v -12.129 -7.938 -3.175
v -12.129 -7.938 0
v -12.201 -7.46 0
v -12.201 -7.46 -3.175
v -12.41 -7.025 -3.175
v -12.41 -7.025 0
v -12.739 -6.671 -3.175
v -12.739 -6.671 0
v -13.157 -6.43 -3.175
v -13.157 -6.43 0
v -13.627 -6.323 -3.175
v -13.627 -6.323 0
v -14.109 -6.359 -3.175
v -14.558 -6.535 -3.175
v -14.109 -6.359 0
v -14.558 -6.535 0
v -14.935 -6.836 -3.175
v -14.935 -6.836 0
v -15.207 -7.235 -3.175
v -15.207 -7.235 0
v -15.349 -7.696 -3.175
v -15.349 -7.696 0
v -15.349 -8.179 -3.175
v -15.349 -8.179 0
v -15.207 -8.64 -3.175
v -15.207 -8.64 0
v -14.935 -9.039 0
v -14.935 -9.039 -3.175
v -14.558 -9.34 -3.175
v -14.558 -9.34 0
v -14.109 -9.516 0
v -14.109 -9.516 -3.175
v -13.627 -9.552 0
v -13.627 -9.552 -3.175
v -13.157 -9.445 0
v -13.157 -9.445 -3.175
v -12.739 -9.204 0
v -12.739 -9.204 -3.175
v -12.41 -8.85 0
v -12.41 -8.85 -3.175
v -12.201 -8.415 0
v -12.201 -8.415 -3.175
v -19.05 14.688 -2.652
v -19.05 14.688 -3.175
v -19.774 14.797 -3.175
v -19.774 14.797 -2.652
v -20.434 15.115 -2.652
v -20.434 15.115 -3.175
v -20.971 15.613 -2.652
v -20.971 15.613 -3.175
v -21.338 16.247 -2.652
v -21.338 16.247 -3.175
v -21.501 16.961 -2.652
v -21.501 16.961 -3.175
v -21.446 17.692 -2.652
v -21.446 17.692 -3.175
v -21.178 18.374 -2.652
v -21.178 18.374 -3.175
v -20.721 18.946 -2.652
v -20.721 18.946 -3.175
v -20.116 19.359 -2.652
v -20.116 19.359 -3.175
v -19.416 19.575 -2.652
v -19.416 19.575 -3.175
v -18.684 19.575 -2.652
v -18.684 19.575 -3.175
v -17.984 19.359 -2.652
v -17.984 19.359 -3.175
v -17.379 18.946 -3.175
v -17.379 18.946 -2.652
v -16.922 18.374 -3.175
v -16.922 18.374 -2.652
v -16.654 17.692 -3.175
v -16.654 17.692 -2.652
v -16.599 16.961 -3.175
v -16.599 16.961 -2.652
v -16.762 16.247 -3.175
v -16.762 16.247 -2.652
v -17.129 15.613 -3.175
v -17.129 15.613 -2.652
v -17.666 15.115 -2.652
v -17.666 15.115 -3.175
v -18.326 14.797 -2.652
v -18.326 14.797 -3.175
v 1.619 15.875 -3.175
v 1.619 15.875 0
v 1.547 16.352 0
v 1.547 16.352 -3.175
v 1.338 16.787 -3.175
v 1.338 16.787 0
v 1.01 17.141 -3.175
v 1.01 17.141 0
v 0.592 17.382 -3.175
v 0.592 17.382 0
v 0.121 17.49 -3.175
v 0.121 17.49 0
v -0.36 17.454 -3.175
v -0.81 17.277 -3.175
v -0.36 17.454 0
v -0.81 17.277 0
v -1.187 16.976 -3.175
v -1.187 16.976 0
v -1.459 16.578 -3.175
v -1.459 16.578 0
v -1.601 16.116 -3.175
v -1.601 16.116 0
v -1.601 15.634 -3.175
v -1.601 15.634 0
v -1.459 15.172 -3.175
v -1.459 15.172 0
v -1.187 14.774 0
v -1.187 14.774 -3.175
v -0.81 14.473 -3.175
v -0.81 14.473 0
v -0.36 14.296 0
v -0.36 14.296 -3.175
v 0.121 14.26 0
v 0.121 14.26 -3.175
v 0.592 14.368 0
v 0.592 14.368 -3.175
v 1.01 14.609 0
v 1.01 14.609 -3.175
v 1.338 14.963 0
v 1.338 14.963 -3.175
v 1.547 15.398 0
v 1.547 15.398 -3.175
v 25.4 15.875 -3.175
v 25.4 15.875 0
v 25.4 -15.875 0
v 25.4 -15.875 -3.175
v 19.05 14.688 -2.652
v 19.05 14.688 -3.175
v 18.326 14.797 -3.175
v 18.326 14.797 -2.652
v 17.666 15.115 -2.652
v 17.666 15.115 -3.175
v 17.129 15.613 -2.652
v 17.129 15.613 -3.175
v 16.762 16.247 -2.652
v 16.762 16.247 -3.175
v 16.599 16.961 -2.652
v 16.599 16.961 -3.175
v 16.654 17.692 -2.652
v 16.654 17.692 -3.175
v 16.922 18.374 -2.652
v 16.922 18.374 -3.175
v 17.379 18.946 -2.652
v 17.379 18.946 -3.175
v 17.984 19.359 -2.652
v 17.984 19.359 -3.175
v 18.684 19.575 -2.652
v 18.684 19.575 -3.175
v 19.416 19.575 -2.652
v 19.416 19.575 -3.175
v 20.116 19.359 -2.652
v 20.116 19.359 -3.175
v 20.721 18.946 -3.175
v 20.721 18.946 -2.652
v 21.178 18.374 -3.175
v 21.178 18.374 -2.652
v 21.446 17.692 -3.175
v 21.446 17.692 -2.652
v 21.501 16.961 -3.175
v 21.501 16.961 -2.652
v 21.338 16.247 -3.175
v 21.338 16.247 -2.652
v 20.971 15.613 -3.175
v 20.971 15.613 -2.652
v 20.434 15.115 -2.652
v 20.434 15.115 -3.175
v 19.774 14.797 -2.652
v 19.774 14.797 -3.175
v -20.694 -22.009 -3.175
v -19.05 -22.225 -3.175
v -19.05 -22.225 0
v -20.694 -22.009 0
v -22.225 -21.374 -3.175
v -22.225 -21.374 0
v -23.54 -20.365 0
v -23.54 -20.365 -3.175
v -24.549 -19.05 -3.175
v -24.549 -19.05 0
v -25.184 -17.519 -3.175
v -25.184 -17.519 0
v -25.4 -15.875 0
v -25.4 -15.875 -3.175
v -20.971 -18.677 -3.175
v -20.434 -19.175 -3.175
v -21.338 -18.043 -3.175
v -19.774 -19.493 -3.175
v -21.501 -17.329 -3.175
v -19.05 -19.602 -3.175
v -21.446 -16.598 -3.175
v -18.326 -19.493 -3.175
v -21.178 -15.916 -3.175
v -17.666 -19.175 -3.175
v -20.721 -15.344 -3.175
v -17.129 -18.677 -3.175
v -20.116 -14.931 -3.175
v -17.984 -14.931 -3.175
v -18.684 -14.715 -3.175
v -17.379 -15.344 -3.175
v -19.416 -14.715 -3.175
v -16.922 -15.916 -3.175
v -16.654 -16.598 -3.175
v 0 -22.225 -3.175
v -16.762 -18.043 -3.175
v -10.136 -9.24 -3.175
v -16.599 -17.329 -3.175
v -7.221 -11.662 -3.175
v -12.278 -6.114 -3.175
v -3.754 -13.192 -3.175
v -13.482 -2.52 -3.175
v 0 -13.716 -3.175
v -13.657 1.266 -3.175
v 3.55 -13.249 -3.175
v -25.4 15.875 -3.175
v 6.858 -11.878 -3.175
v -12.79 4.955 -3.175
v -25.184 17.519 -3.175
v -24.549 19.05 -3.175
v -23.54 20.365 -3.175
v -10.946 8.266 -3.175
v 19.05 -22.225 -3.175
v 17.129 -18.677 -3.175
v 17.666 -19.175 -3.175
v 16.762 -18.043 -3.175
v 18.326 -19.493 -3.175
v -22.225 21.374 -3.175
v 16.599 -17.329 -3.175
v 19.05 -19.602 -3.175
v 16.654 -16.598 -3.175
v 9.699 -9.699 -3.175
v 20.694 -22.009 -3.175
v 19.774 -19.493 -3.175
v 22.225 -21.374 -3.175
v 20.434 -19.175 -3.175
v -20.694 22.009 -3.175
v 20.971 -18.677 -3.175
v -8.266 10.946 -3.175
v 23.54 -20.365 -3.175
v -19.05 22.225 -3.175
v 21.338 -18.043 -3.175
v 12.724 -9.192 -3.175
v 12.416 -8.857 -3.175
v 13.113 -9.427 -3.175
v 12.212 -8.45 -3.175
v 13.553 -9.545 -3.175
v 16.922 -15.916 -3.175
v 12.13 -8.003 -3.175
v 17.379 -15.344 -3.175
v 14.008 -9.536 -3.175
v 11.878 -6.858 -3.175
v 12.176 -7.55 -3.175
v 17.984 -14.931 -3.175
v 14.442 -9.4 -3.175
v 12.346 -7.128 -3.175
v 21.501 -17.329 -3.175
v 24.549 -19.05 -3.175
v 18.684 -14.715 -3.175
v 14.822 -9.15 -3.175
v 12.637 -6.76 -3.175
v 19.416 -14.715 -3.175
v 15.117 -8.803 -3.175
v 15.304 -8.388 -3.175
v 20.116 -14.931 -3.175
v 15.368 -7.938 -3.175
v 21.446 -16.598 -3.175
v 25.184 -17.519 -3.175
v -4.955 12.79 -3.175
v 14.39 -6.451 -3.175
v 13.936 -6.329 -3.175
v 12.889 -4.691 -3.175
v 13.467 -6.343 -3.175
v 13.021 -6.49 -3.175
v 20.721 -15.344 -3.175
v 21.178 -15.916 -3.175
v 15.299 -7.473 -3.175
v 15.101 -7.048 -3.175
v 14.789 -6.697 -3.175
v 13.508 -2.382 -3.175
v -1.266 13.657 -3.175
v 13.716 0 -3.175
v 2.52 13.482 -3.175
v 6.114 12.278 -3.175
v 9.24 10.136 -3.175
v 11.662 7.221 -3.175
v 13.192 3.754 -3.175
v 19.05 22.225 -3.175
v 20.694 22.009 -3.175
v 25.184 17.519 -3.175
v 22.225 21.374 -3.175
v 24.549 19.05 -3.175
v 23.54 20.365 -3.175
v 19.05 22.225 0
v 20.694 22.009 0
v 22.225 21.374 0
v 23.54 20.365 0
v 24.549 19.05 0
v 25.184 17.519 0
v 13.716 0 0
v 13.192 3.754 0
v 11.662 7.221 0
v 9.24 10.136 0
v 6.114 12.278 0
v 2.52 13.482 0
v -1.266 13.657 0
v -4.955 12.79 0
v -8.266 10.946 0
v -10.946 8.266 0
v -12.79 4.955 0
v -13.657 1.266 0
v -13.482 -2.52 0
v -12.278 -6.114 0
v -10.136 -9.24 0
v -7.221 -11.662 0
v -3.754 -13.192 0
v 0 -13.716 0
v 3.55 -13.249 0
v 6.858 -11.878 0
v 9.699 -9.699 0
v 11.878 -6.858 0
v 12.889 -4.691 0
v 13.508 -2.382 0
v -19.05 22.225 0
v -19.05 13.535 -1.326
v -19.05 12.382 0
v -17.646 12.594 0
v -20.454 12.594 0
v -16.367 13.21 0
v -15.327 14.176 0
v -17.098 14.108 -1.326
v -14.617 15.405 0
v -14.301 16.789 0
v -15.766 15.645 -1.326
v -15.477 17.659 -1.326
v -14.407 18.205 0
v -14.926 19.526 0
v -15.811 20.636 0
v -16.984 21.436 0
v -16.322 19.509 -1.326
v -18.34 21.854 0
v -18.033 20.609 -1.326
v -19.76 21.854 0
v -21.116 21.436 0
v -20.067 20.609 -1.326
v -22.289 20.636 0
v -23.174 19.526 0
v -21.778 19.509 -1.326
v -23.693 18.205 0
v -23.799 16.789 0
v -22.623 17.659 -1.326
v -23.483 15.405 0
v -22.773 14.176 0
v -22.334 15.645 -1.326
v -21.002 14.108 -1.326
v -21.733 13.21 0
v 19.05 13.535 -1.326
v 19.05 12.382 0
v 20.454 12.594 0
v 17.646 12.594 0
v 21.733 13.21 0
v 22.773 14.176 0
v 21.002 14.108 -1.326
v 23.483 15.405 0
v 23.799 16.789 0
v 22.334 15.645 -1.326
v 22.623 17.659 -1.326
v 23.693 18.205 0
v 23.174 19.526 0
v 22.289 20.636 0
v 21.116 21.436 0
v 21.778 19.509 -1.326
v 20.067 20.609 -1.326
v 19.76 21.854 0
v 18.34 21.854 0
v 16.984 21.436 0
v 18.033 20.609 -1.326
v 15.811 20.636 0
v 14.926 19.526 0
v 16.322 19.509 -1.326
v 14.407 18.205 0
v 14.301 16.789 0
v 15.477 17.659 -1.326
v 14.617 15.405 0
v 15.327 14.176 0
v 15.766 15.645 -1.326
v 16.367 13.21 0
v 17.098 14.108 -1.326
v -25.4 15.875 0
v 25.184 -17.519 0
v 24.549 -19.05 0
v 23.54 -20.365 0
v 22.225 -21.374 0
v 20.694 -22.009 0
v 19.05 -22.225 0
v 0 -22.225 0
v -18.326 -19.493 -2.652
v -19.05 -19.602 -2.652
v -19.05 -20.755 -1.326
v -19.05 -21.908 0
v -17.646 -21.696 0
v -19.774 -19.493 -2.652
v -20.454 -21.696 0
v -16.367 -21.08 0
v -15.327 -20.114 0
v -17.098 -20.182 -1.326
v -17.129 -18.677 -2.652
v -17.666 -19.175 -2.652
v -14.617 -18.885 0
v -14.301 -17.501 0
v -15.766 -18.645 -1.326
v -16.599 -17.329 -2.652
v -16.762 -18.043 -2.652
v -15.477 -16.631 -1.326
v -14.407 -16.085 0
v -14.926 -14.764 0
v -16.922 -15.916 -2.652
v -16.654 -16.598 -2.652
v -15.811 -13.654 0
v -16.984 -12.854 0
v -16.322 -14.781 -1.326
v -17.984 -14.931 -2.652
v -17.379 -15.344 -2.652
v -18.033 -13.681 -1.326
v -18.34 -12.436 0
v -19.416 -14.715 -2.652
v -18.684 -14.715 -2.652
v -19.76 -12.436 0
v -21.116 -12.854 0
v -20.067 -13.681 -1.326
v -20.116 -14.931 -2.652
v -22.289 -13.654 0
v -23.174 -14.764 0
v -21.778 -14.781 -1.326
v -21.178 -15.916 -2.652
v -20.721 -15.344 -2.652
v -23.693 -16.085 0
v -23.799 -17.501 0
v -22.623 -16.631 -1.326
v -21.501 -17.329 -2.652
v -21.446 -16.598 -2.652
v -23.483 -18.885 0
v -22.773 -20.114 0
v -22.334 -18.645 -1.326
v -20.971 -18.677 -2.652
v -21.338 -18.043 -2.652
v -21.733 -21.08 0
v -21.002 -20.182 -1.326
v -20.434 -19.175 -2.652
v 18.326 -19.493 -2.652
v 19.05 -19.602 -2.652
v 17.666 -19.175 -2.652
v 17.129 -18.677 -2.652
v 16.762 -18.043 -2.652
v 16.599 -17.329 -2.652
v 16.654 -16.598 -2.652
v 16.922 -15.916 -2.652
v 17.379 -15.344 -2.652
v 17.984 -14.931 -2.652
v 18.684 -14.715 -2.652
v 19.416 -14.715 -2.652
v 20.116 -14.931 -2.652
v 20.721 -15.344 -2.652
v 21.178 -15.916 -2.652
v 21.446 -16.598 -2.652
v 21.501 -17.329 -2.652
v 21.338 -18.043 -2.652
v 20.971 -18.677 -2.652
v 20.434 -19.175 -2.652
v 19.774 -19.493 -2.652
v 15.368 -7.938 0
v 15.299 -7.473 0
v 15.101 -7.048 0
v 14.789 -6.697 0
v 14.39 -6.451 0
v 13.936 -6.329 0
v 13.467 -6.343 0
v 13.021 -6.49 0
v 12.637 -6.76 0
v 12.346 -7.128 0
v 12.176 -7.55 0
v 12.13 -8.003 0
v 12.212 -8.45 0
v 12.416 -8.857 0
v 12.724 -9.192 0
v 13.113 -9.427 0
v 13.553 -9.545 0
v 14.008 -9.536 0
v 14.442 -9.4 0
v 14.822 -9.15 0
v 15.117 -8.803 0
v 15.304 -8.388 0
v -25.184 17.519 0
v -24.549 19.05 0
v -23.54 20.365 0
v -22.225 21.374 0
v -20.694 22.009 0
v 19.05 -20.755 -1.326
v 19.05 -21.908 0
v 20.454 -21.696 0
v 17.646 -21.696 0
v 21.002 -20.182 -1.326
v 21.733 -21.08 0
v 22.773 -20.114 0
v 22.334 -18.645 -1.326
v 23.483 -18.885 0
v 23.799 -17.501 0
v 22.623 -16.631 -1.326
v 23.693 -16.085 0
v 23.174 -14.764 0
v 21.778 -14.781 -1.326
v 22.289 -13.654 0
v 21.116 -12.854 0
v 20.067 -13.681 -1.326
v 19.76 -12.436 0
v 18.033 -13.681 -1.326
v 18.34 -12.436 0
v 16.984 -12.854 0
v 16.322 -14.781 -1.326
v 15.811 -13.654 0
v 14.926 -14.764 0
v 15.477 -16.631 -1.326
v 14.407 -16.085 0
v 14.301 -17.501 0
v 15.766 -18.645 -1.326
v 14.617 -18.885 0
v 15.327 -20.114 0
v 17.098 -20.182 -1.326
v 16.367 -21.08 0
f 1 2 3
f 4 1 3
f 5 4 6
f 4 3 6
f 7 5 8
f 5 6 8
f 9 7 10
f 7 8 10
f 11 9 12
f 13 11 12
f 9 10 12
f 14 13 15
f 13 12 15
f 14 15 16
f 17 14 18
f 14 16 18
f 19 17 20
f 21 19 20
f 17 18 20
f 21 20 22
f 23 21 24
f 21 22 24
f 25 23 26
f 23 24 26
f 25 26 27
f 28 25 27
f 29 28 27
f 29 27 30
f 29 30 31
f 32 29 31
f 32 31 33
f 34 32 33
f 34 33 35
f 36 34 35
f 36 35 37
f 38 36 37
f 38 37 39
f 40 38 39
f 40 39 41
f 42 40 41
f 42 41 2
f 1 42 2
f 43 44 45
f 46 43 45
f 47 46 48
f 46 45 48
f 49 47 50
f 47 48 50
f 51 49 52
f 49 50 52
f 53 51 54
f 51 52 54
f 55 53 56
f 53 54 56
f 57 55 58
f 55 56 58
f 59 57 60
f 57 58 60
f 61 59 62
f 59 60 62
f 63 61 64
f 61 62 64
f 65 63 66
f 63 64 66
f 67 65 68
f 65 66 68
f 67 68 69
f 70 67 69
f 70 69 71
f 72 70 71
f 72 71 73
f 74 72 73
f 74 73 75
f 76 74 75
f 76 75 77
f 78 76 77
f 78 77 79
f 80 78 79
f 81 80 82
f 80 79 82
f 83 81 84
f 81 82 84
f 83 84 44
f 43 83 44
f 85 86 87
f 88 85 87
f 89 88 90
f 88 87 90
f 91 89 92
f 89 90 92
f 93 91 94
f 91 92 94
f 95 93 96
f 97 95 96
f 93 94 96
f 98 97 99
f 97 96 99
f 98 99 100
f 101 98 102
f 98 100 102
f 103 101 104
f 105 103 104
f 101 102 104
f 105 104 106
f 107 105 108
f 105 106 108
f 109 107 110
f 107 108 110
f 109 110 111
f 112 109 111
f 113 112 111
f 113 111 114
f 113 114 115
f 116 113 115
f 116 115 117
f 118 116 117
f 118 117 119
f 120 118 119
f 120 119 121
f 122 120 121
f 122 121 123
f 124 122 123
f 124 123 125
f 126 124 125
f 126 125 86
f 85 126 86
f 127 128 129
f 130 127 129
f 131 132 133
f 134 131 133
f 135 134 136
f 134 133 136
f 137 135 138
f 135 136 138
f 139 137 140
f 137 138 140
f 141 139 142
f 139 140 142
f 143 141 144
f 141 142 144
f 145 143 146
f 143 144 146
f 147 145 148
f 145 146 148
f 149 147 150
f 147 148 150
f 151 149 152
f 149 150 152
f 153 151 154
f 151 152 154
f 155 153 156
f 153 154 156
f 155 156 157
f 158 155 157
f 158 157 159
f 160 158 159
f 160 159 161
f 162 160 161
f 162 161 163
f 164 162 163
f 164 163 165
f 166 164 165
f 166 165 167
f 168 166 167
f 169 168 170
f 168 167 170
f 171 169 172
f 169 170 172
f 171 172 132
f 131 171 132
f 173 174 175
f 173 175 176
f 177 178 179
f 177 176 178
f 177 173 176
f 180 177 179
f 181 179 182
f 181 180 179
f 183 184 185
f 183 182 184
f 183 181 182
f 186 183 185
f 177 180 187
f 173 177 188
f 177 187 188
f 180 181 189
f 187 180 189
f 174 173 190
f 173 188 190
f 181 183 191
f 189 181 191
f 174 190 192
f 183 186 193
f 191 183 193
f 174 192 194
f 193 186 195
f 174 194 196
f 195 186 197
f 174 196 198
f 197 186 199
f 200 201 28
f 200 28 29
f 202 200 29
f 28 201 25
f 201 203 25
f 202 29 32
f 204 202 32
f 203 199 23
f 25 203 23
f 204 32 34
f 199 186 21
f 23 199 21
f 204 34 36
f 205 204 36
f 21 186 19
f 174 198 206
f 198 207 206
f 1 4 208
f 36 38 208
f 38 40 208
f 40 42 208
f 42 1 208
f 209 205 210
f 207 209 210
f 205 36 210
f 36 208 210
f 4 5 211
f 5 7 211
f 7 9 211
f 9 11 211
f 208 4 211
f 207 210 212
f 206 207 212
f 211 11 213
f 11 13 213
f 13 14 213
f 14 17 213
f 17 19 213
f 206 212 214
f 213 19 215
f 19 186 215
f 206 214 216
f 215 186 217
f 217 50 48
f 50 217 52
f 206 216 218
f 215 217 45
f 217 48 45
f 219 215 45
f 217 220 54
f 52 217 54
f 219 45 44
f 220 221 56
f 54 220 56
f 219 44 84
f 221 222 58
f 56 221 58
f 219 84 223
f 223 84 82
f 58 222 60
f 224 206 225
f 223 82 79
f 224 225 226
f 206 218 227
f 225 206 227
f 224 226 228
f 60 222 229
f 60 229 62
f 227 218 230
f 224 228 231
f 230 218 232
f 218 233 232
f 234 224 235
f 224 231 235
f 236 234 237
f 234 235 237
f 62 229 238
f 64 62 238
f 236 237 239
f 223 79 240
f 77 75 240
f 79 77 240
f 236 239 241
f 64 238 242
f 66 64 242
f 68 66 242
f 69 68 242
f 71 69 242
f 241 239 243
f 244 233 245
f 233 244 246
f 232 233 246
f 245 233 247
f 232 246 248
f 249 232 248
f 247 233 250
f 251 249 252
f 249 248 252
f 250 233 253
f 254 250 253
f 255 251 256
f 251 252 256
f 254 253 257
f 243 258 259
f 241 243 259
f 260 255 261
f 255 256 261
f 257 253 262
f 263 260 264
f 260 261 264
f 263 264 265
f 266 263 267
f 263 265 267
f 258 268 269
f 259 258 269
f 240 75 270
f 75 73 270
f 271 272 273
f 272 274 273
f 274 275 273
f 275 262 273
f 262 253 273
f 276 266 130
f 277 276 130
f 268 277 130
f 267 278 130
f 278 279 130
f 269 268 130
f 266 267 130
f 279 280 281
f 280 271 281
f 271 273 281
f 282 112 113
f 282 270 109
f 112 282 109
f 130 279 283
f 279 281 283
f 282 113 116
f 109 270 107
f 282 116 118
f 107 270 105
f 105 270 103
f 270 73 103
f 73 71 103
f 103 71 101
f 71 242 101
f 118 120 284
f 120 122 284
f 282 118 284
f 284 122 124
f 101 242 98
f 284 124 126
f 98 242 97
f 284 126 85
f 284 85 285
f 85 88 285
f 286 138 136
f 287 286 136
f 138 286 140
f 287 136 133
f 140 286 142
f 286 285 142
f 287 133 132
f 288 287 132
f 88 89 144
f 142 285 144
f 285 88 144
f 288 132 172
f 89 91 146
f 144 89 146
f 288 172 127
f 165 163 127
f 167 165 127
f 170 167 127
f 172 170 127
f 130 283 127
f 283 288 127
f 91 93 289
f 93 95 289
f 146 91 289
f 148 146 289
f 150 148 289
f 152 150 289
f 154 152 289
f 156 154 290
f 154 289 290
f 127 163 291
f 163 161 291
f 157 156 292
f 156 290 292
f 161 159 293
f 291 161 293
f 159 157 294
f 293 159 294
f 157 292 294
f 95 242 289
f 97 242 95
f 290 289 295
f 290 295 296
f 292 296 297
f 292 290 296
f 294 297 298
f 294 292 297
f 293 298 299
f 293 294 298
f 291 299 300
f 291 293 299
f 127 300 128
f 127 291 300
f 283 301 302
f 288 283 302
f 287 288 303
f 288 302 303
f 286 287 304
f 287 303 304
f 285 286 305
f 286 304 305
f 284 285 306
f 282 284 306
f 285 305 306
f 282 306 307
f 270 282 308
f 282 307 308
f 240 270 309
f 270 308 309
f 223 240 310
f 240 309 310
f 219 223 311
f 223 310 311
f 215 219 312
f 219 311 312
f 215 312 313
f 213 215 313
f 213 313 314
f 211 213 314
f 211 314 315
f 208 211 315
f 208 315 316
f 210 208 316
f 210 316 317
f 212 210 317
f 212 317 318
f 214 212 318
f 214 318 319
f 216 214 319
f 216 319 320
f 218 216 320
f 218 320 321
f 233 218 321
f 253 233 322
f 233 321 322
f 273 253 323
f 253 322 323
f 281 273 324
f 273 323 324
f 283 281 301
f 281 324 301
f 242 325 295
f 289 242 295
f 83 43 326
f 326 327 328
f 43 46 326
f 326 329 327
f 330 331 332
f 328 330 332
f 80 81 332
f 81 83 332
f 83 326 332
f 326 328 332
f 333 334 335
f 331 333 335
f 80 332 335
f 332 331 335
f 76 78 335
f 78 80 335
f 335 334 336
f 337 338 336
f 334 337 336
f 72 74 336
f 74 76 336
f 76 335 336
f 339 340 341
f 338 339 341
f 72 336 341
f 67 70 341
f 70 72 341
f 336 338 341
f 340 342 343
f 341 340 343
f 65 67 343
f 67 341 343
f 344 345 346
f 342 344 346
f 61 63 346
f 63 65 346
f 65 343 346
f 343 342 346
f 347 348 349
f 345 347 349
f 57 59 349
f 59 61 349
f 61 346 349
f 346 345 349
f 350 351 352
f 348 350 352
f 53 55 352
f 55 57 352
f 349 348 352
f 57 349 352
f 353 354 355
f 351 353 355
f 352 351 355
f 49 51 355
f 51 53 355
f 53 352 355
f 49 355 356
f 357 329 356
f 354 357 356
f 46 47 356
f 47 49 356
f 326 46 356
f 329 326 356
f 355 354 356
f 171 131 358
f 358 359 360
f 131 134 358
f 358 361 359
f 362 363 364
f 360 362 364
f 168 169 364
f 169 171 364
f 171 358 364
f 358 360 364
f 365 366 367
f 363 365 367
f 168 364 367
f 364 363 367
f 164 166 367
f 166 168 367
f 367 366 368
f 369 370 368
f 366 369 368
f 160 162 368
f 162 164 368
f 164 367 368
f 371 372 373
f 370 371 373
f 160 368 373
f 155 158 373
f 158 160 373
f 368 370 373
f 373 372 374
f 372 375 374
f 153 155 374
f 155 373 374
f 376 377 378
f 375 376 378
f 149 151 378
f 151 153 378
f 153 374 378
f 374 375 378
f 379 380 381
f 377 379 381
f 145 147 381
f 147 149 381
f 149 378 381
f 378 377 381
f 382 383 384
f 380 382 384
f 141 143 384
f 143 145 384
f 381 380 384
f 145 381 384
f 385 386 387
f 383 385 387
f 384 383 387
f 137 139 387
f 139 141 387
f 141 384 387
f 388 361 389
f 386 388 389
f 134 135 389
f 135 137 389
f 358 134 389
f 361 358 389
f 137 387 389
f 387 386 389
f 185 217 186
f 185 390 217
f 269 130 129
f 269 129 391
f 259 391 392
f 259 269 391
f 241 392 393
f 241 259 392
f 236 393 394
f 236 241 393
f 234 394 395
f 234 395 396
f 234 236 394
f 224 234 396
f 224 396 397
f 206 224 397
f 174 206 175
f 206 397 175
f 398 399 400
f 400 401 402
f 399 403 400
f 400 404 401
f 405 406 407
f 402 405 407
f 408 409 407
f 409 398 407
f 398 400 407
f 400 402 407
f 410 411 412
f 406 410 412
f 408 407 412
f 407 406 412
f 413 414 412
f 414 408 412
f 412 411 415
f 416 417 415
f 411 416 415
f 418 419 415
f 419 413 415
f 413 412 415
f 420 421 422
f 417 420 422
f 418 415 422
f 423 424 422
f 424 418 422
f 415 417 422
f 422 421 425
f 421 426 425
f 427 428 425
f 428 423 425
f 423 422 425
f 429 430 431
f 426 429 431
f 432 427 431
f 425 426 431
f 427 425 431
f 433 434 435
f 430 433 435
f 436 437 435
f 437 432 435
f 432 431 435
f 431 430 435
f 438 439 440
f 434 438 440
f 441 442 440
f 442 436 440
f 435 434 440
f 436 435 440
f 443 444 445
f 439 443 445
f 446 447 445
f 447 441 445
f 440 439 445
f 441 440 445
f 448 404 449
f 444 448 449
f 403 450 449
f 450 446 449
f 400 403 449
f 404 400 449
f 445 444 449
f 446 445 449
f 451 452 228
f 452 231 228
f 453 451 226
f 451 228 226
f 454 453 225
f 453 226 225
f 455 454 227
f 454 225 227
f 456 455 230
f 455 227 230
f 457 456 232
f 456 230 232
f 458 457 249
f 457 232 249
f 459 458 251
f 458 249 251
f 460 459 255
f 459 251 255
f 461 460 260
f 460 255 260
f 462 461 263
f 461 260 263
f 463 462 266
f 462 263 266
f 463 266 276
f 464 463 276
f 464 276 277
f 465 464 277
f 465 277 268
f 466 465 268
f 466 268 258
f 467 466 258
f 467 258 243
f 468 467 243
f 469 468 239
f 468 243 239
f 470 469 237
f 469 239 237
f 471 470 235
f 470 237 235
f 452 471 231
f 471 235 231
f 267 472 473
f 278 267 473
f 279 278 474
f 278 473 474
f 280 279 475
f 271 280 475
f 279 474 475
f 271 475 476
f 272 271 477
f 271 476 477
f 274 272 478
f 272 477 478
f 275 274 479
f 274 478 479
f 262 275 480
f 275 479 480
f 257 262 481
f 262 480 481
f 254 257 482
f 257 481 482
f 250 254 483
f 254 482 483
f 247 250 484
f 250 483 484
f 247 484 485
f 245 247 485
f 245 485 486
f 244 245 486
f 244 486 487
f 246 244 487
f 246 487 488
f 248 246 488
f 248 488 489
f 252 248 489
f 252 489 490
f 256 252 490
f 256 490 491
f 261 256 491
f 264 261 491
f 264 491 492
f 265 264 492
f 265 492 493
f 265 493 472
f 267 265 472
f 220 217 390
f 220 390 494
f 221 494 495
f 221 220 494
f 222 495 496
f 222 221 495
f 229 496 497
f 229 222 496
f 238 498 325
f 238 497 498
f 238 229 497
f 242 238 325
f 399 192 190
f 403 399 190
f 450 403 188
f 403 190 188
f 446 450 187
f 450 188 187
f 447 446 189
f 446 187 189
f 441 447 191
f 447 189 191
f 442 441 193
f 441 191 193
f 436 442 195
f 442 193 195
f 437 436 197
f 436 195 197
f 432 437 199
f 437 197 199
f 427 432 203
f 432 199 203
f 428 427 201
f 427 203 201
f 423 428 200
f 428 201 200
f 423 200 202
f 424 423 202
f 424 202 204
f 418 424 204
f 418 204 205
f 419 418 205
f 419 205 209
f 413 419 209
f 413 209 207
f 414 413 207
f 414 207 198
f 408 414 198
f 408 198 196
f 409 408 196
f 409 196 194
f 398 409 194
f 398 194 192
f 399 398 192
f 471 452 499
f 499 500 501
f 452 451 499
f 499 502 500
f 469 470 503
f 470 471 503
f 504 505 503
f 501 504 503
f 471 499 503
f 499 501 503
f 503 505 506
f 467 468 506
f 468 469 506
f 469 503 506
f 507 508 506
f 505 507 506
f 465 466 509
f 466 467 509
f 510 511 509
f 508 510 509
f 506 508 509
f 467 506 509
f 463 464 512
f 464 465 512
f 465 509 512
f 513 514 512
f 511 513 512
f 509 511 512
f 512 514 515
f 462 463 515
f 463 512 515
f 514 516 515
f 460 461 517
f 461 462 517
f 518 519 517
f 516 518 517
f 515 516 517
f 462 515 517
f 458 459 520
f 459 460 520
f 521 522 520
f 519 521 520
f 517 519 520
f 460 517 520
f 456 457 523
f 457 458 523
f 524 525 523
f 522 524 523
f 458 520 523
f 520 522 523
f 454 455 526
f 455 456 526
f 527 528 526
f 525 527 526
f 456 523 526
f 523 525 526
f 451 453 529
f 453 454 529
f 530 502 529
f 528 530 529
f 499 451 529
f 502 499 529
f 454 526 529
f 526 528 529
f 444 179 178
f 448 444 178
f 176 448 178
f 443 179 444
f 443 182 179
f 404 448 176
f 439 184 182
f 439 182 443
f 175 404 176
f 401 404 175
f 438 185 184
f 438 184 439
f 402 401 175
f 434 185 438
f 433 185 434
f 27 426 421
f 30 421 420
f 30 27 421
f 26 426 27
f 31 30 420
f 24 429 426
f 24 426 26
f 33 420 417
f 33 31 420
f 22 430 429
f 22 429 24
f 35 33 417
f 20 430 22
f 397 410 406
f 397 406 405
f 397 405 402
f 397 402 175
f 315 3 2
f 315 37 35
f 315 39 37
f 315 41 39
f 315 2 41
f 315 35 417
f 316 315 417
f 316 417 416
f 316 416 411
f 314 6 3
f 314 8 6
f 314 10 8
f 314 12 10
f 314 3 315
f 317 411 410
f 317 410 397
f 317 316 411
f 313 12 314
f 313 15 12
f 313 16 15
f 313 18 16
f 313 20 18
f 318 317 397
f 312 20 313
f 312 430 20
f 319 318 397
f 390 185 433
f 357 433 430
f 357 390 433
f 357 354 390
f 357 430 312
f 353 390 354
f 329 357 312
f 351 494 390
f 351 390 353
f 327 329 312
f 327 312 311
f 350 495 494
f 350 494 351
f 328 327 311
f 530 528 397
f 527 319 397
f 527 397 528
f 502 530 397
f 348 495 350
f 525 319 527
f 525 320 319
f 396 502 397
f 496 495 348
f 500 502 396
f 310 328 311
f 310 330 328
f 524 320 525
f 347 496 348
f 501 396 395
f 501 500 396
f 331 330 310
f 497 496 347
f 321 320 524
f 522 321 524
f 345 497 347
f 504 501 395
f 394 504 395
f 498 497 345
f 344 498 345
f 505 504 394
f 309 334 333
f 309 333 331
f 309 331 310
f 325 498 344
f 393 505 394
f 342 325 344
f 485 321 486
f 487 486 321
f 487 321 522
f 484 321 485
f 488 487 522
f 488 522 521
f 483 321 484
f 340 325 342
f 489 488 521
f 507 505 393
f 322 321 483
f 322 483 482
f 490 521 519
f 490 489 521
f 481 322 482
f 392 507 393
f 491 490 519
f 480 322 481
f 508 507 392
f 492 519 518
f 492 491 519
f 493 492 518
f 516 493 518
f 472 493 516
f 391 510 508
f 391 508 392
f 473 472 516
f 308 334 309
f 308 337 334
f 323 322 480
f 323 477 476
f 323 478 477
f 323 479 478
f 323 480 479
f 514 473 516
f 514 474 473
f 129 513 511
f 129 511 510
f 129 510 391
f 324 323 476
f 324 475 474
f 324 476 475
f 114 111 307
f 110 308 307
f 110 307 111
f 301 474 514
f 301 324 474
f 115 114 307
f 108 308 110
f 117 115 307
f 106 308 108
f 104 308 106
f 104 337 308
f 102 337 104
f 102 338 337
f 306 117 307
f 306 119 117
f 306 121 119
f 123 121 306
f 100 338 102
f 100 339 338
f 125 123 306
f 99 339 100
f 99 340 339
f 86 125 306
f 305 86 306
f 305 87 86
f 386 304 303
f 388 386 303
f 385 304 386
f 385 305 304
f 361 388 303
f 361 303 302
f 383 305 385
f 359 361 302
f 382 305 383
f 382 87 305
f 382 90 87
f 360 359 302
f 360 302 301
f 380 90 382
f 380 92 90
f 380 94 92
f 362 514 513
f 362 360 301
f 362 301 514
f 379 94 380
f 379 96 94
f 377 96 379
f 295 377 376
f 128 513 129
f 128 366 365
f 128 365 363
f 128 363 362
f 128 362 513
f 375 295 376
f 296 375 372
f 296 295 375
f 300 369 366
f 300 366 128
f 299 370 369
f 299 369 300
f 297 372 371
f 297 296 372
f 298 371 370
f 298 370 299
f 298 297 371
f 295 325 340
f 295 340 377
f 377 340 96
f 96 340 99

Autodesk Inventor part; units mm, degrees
ref_plane "YZ Plane" through (0, 0, 0) normal (1, 0, 0) x (0, 1, 0)
ref_plane "XZ Plane" through (0, 0, 0) normal (0, 1, 0) x (-1, 0, 0)
ref_plane "XY Plane" through (0, 0, 0) normal (0, 0, 1) x (1, 0, 0)
sketch "Sketch1" plane through (0, 0, 0) normal (0, 0, 1) x (1, 0, 0)
  line L0 (-31.75, 22.225) -> (31.75, 22.225)
  line L1 (31.75, 22.225) -> (31.75, -22.225)
  line L2 (31.75, -22.225) -> (-31.75, -22.225)
  line L3 (-31.75, -22.225) -> (-31.75, 22.225)
  circle A0 centre (0, 0) radius 13.716
  circle A1 centre (0, 0) radius 13.6017
  circle A2 centre (13.7482, -7.9375) radius 1.6193
  circle A3 centre (0, 0) radius 15.875 construction
  circle A4 centre (0, 15.875) radius 1.6193
  circle A5 centre (-13.7482, -7.9375) radius 1.6193
  circle A6 centre (0, 0) radius 21.59 construction
  line L4 (0, 0) -> (13.7482, -7.9375)
  line L5 (0, 0) -> (0, -22.225)
  line L6 (0, 0) -> (0, -22.225)
  line L7 (-31.75, 22.225) -> (-25.4, 22.225)
  line L8 (-25.4, 22.225) -> (-25.4, -22.225)
  line L9 (-25.4, -22.225) -> (-31.75, -22.225)
  line L10 (-31.75, -22.225) -> (-31.75, 22.225)
  line L11 (31.75, 22.225) -> (25.4, 22.225)
  line L12 (25.4, 22.225) -> (25.4, -22.225)
  line L13 (25.4, -22.225) -> (31.75, -22.225)
  line L14 (31.75, -22.225) -> (31.75, 22.225)
  point P0 (-19.05, 17.145)
  point P1 (-19.05, -17.145)
  point P2 (19.05, -17.145)
  point P3 (19.05, 17.145)
  dimension "d0" = 44.45
  dimension "d1" = 63.5
  dimension "d2" = 31.75
  dimension "d3" = 22.225
  dimension "d4" = 27.432
  dimension "d7" = 3.2385
  dimension "d9" = 15.875
  dimension "d15" = 360
  dimension "d17" = 43.18
  dimension "d18" = 5.08
  dimension "d19" = 5.08
  dimension "d20" = 19.05
  dimension "d21" = 19.05
  dimension "d31" = 34.29
  dimension "d32" = 38.1
  dimension "d35" = 60
  dimension "d36" = 6.35
  dimension "d37" = 6.35
extrude "Extrusion1" add sketch "Sketch1" against normal blind 3.175
hole "Hole1" at (-19.05, 17.145, 0) at (-19.05, -17.145, 0) at (19.05, -17.145, 0) at (19.05, 17.145, 0) direction (0, 0, -1) diameter 4.9149 end through all countersink diameter 9.525 countersink angle 82
extrude "Extrusion2" cut sketch "Sketch1" against normal through all contours L0 L8 L2 L3 | L0 L1 L2 L12
fillet "Fillet1" radius 6.35 4 edges at (25.4, 22.225, -1.5875) (25.4, -22.225, -1.5875) (-25.4, -22.225, -1.5875) (-25.4, 22.225, -1.5875)
equation "\"d2\" = 0.5 * d1"
equation "\"d3\" = 0.5 * d0"
properties part number "Dewalt Drill Cap Rotation plate"
